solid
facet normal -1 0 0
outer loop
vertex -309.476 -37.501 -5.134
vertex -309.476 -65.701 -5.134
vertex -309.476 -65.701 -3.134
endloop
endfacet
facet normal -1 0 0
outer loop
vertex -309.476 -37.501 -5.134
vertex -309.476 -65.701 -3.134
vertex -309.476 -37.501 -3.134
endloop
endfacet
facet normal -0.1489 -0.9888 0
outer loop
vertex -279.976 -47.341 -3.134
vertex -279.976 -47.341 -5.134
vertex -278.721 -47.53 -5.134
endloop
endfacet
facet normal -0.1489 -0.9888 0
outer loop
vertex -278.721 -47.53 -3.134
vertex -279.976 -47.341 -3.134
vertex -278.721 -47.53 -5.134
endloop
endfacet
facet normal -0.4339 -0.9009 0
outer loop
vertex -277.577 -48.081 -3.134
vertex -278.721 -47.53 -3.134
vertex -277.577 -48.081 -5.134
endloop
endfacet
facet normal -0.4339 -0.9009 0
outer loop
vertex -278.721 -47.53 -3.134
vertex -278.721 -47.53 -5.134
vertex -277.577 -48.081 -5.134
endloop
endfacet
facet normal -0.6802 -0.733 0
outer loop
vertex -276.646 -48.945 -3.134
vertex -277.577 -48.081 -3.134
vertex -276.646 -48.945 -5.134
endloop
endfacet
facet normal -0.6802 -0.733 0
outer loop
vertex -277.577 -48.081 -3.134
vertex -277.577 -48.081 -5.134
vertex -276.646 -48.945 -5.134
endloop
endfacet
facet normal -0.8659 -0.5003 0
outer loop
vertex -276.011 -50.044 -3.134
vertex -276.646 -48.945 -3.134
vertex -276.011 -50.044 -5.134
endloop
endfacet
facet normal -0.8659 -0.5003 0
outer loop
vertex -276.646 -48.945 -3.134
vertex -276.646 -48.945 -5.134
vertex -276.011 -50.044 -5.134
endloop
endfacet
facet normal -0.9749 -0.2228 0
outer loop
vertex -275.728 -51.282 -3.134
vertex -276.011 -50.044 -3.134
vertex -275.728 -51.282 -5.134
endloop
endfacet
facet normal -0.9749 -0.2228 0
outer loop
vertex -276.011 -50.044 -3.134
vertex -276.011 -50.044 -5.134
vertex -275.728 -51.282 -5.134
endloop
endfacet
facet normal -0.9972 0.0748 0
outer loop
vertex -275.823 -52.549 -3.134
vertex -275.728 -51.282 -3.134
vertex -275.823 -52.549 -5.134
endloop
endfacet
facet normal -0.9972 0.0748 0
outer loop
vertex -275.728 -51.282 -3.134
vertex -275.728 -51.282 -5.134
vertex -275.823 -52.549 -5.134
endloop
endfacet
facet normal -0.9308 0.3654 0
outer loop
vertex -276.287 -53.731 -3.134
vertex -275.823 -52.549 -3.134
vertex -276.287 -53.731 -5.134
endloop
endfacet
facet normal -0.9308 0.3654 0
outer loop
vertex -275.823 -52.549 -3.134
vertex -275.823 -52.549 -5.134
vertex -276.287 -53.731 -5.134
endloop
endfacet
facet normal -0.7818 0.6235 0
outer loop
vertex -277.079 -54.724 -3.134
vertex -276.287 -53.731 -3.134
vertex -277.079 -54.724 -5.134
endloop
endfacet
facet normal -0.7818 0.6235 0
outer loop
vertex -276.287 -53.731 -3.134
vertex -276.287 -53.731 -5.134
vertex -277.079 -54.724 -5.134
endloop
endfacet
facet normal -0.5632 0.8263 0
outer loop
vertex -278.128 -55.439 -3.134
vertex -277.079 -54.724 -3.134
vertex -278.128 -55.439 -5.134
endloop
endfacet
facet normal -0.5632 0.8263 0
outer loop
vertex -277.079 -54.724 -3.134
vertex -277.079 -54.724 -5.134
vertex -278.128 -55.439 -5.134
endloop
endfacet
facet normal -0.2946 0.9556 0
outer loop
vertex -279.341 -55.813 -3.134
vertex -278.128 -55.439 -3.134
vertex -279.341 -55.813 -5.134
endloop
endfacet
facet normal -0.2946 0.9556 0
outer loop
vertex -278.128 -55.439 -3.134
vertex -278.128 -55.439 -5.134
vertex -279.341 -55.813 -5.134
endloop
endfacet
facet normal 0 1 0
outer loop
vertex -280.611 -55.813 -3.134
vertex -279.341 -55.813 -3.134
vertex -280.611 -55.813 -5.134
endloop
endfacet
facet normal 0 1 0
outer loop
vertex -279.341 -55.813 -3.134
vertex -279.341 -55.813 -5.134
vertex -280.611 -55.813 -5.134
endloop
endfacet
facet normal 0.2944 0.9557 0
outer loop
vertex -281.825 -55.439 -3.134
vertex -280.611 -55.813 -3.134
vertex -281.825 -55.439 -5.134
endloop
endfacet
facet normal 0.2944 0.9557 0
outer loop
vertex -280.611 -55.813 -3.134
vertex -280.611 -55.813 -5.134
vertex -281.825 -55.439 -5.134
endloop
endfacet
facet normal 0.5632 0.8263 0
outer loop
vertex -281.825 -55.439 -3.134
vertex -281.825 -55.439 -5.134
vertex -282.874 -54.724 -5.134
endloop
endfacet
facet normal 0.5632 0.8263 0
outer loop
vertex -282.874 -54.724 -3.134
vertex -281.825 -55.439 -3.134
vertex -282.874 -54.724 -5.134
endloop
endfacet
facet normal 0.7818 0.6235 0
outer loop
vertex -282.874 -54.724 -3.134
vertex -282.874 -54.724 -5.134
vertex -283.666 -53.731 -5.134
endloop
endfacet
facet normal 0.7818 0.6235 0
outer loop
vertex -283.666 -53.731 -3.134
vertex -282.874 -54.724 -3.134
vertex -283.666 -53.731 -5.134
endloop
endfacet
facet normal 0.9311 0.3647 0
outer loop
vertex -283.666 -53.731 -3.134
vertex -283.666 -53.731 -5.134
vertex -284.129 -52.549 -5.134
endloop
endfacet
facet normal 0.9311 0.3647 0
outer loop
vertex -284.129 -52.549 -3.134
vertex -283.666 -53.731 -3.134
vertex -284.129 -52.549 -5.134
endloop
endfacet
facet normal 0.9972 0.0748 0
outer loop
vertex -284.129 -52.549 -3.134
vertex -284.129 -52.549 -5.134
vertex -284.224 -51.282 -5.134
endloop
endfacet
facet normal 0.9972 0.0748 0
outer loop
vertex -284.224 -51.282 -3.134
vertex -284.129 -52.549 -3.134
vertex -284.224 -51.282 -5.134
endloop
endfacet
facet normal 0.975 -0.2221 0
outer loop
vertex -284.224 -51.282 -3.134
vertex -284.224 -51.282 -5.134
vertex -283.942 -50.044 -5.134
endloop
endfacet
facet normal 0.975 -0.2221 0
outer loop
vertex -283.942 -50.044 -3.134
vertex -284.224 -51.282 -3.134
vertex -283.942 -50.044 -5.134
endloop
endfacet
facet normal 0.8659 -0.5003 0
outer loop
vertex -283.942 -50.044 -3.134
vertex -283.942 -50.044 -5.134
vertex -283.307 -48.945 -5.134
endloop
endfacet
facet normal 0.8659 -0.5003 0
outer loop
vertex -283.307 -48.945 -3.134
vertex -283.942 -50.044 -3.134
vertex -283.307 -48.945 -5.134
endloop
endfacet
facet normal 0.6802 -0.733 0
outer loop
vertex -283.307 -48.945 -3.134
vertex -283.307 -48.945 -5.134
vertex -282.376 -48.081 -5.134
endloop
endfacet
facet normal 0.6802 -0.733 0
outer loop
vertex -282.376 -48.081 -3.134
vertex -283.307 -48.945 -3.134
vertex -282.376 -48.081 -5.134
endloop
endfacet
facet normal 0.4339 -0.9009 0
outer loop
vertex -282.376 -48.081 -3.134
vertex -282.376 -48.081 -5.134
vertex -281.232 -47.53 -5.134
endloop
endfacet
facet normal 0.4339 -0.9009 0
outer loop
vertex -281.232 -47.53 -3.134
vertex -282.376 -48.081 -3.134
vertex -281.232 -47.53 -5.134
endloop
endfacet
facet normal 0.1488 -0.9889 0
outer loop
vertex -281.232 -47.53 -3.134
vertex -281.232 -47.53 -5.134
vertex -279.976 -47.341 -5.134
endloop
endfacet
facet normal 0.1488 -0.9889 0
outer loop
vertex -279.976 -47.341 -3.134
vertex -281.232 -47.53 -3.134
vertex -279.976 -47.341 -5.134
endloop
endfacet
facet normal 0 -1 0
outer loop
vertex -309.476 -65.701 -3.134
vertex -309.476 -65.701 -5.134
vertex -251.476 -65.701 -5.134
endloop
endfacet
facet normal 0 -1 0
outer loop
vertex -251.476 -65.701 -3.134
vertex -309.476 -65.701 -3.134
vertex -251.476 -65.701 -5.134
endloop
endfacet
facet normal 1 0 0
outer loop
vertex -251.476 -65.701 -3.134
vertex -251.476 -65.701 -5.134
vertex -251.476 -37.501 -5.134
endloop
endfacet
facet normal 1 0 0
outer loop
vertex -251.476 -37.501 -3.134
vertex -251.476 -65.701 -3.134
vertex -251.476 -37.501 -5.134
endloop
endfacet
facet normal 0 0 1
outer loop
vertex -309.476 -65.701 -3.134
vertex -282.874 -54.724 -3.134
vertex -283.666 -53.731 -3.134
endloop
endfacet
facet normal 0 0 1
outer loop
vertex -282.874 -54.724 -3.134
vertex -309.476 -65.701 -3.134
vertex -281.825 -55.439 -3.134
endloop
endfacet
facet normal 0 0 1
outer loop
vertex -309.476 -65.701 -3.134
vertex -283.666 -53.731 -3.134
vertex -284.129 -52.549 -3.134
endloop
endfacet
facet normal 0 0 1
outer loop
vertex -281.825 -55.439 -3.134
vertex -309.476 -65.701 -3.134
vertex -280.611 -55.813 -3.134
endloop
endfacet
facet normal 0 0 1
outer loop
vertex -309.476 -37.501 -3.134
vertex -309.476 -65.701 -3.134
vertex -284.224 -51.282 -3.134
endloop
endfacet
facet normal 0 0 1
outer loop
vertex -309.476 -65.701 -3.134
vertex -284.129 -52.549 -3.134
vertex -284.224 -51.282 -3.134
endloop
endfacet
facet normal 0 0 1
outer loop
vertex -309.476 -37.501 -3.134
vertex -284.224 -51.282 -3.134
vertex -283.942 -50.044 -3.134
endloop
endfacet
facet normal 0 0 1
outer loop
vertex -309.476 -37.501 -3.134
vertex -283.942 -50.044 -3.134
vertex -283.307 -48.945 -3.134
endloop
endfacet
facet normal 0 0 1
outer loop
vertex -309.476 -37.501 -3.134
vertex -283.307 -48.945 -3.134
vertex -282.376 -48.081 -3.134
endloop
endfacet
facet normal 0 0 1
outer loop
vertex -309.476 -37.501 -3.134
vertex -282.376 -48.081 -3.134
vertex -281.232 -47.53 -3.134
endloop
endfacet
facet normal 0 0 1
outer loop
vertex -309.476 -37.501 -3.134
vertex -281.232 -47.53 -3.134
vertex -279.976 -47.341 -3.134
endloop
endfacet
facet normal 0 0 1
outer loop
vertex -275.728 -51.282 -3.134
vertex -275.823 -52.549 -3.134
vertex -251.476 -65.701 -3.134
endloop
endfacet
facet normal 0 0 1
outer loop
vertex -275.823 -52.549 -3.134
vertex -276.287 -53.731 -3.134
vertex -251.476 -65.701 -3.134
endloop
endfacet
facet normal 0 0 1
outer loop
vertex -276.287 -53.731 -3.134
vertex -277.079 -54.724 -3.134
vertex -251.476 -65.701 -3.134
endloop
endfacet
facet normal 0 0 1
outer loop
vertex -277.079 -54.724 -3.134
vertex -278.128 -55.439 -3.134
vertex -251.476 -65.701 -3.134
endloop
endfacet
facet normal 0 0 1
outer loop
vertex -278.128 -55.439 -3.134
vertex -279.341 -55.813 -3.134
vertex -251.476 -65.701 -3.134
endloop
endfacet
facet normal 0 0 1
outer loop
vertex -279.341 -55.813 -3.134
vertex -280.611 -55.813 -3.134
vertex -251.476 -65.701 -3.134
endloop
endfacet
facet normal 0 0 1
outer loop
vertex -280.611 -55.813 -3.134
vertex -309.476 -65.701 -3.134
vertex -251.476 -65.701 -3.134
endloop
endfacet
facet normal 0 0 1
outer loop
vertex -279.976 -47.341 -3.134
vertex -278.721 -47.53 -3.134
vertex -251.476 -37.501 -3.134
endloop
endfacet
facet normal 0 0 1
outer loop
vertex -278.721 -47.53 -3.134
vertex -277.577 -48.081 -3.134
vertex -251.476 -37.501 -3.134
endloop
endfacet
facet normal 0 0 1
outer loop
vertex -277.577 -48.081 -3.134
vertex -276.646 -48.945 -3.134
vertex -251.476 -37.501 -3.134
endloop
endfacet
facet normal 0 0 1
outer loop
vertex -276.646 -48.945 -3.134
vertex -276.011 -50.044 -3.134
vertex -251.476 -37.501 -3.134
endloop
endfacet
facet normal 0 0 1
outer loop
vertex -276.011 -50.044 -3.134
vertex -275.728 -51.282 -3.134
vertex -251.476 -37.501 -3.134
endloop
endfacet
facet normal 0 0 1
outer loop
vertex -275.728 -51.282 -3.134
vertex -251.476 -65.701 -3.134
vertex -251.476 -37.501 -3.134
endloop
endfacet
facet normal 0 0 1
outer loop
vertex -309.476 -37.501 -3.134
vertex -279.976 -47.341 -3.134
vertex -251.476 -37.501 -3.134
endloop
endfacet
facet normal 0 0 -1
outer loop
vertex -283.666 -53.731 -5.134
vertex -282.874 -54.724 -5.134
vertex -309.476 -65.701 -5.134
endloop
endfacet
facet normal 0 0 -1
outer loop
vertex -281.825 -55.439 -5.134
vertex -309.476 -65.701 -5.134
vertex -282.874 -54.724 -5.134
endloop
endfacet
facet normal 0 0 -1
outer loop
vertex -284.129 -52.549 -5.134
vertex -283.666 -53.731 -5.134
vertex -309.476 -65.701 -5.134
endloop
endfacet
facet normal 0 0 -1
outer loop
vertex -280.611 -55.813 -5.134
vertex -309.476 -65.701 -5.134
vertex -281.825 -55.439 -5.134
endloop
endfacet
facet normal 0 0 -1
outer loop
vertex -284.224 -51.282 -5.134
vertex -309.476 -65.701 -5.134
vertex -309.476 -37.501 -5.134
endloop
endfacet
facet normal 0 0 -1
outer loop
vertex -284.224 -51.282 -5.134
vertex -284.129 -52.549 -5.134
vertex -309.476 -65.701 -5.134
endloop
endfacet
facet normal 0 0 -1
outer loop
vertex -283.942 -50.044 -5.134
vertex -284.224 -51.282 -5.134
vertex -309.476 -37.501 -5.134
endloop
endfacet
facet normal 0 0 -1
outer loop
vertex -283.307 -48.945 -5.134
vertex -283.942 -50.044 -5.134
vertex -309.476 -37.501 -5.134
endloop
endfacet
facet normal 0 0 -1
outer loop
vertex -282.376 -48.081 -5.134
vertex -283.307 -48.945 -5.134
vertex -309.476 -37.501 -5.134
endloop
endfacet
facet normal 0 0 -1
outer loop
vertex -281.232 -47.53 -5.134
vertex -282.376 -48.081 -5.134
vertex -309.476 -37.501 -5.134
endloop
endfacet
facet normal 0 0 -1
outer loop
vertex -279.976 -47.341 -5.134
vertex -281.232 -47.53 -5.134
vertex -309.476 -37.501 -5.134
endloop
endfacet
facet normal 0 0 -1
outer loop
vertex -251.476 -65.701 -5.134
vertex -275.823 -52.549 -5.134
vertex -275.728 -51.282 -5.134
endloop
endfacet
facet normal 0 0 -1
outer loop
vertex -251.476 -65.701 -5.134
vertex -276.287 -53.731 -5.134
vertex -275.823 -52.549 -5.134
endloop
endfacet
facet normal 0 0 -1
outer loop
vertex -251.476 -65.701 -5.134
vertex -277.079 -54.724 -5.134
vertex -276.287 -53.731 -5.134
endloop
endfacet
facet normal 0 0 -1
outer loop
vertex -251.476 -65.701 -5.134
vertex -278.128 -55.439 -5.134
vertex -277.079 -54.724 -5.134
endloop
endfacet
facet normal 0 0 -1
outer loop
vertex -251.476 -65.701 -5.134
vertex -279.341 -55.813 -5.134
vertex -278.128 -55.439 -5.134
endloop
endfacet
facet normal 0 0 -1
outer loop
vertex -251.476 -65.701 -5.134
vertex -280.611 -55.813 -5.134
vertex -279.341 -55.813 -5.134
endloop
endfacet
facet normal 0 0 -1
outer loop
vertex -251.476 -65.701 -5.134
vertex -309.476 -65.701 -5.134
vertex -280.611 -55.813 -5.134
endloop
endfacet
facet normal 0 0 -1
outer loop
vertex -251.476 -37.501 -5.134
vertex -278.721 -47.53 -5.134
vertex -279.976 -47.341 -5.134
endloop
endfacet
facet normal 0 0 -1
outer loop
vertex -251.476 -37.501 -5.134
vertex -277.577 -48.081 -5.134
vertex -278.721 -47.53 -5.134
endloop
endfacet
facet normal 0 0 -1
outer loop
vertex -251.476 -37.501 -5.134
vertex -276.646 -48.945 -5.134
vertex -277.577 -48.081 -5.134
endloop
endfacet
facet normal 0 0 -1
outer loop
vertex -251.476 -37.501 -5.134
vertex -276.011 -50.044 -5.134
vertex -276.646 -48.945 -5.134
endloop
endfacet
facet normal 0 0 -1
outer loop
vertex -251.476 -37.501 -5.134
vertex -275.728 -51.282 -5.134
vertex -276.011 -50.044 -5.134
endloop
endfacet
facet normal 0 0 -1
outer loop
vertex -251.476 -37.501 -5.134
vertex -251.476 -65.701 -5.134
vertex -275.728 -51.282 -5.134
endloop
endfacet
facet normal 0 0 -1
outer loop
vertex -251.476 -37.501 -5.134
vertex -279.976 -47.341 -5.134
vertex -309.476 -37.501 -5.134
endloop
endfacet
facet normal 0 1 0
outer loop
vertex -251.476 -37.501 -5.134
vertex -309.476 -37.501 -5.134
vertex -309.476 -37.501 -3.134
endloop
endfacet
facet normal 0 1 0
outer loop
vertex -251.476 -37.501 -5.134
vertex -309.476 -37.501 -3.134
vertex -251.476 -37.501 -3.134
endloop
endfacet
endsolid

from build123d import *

# Parameters (mm, degrees)
CIRCLE_R           = 4.26
EXTRUSION001_DEPTH = 34.920666
RECTANGLE_W        = 28.2
RECTANGLE_H        = 58
EXTRUSION_DEPTH    = 2


with BuildPart() as extrusion001:
    # Circle → Extrusion001 (new body)
    with BuildSketch(Plane(origin=(-279.976256, -51.600832, -5.133948), x_dir=(0, 1, 0), z_dir=(0, 0, -1))):
        Circle(CIRCLE_R)
    extrude(amount=-EXTRUSION001_DEPTH)


with BuildPart() as cut001:
    # Rectangle → Extrusion (new body)
    with BuildSketch(Plane(origin=(-309.476256, -65.700832, -5.133948), x_dir=(0, 1, 0), z_dir=(0, 0, -1))):
        with Locations((14.1, 29)):
            Rectangle(RECTANGLE_W, RECTANGLE_H)
    extrude(amount=-EXTRUSION_DEPTH)

    # Cut001: cut Extrusion001
    add(extrusion001.part, mode=Mode.SUBTRACT)


solid = cut001.part
